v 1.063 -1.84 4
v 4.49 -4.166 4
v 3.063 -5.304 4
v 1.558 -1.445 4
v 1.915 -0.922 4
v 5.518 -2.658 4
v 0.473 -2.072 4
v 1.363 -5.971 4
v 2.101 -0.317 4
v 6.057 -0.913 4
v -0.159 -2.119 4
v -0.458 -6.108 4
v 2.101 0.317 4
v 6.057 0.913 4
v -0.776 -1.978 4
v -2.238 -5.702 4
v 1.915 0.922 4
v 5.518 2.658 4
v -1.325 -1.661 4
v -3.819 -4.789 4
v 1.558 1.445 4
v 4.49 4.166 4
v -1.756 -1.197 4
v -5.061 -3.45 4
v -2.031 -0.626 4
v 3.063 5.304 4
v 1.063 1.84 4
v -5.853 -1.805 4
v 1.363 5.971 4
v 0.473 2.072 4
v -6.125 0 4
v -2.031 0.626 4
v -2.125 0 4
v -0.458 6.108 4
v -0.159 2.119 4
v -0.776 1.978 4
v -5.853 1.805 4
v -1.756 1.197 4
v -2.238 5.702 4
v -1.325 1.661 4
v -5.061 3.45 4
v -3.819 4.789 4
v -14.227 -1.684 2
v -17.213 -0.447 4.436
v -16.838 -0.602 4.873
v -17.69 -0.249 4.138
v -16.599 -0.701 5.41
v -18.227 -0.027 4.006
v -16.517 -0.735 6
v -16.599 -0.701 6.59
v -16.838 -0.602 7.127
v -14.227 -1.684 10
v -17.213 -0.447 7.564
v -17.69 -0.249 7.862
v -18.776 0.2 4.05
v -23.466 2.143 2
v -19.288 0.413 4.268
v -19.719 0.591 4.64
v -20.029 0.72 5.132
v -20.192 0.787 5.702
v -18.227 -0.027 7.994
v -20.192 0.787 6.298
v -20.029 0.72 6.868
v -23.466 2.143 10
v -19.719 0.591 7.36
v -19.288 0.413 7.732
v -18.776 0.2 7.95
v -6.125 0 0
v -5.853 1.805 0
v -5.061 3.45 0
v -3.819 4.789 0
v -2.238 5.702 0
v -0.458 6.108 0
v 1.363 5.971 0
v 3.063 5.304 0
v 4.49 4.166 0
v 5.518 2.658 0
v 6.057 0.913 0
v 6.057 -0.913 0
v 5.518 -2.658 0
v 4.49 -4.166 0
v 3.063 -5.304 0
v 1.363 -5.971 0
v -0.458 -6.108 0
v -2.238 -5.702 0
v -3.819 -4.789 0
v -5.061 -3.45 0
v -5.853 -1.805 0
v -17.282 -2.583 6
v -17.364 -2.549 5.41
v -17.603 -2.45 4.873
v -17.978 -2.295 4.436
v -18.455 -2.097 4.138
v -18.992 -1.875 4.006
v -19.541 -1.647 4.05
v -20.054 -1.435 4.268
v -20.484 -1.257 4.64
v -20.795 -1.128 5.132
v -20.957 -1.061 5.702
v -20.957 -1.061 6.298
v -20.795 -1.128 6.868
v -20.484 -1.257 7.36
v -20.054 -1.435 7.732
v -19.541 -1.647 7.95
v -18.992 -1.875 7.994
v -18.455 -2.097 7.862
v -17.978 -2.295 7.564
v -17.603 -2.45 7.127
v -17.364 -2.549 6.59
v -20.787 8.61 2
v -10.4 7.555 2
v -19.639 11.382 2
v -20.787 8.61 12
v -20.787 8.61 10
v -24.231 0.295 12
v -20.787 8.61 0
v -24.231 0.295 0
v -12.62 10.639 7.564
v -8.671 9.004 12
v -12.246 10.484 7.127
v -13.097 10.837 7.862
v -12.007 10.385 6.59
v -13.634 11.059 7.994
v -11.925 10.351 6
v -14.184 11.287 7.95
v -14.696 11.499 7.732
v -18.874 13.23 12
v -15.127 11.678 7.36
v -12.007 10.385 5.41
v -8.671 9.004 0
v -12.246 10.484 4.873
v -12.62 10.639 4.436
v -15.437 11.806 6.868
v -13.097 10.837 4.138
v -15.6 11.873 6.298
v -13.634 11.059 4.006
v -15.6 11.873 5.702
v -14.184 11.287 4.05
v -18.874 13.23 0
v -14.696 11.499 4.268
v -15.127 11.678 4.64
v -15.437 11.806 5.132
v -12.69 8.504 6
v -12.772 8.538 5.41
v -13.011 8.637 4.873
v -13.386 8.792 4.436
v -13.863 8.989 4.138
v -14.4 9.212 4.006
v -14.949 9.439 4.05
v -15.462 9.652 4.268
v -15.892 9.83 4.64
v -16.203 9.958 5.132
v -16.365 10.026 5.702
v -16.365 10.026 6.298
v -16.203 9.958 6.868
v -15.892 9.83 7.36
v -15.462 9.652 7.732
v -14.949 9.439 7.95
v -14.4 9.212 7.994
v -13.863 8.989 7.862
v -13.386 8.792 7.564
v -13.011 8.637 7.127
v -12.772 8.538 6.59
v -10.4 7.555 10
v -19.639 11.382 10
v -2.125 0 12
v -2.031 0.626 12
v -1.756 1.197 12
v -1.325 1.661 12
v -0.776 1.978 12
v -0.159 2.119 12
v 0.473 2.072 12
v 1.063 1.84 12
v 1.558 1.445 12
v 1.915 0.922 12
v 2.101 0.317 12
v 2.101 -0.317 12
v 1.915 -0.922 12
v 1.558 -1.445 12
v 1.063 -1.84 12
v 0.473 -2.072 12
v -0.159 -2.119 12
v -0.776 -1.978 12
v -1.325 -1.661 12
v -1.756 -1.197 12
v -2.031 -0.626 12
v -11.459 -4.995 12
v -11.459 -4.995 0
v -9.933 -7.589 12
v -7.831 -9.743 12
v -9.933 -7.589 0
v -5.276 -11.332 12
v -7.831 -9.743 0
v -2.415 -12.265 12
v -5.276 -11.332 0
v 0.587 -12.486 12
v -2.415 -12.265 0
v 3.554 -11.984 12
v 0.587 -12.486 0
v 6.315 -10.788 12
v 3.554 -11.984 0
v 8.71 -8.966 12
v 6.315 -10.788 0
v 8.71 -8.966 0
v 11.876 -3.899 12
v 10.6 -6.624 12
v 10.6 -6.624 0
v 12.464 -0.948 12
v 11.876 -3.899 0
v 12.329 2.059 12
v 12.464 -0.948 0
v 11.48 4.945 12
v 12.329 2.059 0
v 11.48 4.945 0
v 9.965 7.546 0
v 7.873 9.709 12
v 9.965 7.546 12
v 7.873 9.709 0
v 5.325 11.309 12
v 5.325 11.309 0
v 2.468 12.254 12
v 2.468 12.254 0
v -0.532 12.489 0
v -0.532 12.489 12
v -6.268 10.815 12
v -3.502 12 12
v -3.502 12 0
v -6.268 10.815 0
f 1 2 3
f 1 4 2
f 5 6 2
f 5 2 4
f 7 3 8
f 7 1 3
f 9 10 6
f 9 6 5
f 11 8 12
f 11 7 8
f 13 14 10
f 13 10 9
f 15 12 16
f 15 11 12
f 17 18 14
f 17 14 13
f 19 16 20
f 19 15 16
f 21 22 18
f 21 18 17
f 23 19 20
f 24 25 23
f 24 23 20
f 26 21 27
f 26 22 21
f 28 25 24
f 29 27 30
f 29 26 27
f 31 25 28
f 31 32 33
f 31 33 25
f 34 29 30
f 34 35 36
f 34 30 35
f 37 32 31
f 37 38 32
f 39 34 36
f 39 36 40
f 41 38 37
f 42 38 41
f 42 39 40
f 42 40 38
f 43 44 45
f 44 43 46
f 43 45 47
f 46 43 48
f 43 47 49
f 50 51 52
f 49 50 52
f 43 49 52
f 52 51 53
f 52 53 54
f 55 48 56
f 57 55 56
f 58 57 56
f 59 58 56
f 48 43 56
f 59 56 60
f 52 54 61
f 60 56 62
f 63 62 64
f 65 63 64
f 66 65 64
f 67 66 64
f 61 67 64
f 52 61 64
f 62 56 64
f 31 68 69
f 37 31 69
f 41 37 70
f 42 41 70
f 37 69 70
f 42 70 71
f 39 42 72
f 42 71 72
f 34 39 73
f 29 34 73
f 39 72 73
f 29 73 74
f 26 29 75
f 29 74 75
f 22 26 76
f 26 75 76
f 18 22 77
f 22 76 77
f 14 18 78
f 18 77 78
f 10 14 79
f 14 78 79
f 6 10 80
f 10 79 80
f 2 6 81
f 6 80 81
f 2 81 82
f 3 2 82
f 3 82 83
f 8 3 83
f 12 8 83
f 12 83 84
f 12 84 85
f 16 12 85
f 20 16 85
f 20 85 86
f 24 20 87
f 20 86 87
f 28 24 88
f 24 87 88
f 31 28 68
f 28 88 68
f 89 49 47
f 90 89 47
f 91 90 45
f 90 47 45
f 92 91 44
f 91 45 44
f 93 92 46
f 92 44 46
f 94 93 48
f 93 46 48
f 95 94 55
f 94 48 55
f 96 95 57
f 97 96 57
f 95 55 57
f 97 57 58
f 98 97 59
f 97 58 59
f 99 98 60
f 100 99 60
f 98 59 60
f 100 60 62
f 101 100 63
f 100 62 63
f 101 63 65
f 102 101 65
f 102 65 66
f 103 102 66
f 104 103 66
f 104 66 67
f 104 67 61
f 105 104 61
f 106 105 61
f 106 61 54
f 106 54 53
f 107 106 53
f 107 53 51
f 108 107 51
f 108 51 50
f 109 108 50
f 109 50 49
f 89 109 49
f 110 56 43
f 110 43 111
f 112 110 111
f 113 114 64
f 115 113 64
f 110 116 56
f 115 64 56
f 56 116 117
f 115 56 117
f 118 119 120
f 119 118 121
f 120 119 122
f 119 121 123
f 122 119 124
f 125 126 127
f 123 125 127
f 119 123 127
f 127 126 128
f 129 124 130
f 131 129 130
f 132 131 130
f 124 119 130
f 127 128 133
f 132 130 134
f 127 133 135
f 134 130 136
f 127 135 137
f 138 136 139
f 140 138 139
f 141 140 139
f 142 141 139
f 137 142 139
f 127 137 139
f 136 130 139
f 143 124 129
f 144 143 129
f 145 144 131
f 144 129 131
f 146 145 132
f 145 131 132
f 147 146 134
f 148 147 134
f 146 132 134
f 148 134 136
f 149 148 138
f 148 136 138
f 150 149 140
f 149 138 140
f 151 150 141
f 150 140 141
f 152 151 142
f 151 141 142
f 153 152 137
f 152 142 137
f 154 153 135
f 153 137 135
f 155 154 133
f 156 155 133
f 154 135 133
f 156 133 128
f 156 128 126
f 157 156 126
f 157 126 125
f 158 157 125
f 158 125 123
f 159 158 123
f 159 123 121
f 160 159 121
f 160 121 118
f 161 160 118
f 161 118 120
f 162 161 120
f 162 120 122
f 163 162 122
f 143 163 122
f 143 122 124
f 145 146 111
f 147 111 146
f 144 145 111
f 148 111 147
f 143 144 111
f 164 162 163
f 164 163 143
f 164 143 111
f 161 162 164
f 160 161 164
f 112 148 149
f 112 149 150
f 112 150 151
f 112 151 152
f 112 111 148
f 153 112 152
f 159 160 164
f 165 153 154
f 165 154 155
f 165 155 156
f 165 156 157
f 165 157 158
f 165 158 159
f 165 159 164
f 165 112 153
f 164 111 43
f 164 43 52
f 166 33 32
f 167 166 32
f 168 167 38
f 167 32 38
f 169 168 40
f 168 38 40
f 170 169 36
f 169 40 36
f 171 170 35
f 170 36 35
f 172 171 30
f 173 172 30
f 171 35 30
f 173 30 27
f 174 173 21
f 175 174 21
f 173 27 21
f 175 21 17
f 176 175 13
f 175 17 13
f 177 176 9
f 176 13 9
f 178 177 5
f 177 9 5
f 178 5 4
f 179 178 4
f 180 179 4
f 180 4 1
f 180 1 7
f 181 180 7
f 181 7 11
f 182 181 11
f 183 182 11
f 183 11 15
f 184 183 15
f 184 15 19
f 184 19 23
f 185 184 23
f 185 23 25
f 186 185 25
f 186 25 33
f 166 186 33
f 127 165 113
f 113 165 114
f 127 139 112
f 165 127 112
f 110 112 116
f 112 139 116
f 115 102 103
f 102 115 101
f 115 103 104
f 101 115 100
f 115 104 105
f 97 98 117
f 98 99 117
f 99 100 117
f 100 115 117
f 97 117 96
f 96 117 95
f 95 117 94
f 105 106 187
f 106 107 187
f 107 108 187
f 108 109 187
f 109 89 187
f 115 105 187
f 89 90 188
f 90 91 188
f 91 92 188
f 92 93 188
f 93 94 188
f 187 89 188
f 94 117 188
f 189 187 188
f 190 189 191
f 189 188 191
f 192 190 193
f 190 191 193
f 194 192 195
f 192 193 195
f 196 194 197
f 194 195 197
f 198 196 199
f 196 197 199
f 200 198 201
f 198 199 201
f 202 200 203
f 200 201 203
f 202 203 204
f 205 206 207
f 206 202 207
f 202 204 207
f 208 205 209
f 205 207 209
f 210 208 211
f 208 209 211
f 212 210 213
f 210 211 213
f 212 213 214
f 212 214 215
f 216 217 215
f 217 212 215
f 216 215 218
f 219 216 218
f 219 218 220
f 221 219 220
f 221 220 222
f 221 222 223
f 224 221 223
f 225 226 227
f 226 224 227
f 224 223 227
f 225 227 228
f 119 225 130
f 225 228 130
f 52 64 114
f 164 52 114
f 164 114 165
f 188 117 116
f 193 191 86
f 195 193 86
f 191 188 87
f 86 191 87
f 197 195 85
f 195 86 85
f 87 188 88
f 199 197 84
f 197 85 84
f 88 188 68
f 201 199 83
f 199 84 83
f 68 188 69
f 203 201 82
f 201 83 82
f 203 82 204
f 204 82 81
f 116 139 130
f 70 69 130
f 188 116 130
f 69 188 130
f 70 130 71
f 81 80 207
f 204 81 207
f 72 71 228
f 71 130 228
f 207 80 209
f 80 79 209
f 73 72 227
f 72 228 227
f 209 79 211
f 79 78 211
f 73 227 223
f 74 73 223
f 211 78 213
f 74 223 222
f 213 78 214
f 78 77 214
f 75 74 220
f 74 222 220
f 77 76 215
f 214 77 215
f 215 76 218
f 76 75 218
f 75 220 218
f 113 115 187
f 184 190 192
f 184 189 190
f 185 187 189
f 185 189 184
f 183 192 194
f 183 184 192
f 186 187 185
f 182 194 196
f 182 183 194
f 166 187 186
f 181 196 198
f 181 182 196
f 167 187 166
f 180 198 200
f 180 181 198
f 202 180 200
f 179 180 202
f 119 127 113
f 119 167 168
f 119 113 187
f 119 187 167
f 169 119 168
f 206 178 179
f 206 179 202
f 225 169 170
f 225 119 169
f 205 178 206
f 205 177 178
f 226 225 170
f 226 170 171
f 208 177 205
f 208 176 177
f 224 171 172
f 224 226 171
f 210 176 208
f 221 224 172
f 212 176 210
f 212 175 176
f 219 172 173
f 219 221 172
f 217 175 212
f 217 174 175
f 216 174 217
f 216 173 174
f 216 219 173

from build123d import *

# Parameters (mm, degrees)
SKETCH1_R           = 12.5
BOSS_EXTRUDE2_DEPTH = 12
BOSS_EXTRUDE3_DEPTH = 12
SKETCH3_W           = 8
SKETCH3_H           = 10
CUT_EXTRUDE1_DEPTH  = 10
SKETCH4_R           = 2
CUT_EXTRUDE2_DEPTH  = 14
SKETCH6_R           = 6.125
CUT_EXTRUDE3_DEPTH  = 4
SKETCH7_R           = 2.125
CUT_EXTRUDE4_DEPTH  = 9


with BuildPart() as part:
    # Sketch1 → Boss-Extrude2 (new body)
    with BuildSketch(Plane.XY):
        Circle(SKETCH1_R)
    extrude(amount=BOSS_EXTRUDE2_DEPTH)

    # Sketch2 → Boss-Extrude3 (add)
    with BuildSketch(Plane.XY):
        with BuildLine():
            Line((-24.231440373, 0.295461436), (-11.458506302, -4.995261088))
            ThreePointArc((-11.458506302, -4.995261088), (-12.259311424, 2.441164357), (-8.670952565, 9.003587153))
            Line((-8.670952565, 9.003587153), (-18.87387232, 13.229774891))
            Line((-18.87387232, 13.229774891), (-20.787289482, 8.610377228))
            Line((-20.787289482, 8.610377228), (-24.231440373, 0.295461436))
        make_face()
    extrude(amount=BOSS_EXTRUDE3_DEPTH)

    # Sketch3 → Cut-Extrude1 (cut)
    with BuildSketch(Plane(origin=(-20.787289482, 8.610377228, 0), x_dir=(0, 0, 1), z_dir=(-0.923879533, 0.382683432, 0))):
        with Locations((6, -2)):
            Rectangle(SKETCH3_W, SKETCH3_H)
    extrude(amount=-CUT_EXTRUDE1_DEPTH, mode=Mode.SUBTRACT)

    # Sketch4 → Cut-Extrude2 (cut)
    with BuildSketch(Plane(origin=(1.913417162, 4.619397663, 0), x_dir=(0.923879533, -0.382683432, 0), z_dir=(0.382683432, 0.923879533, 0))):
        with Locations((-16.978219619, -6)):
            Circle(SKETCH4_R)
    extrude(amount=-CUT_EXTRUDE2_DEPTH, mode=Mode.SUBTRACT)

    # Sketch6 → Cut-Extrude3 (cut)
    with BuildSketch(Plane(origin=(0, 0, 0), x_dir=(-1, 0, 0), z_dir=(0, 0, -1))):
        Circle(SKETCH6_R)
    extrude(amount=-CUT_EXTRUDE3_DEPTH, mode=Mode.SUBTRACT)

    # Sketch7 → Cut-Extrude4 (cut, through all)
    with BuildSketch(Plane(origin=(0, 0, 4), x_dir=(-1, 0, 0), z_dir=(0, 0, -1))):
        Circle(SKETCH7_R)
    extrude(amount=-CUT_EXTRUDE4_DEPTH, mode=Mode.SUBTRACT)


solid = part.part
